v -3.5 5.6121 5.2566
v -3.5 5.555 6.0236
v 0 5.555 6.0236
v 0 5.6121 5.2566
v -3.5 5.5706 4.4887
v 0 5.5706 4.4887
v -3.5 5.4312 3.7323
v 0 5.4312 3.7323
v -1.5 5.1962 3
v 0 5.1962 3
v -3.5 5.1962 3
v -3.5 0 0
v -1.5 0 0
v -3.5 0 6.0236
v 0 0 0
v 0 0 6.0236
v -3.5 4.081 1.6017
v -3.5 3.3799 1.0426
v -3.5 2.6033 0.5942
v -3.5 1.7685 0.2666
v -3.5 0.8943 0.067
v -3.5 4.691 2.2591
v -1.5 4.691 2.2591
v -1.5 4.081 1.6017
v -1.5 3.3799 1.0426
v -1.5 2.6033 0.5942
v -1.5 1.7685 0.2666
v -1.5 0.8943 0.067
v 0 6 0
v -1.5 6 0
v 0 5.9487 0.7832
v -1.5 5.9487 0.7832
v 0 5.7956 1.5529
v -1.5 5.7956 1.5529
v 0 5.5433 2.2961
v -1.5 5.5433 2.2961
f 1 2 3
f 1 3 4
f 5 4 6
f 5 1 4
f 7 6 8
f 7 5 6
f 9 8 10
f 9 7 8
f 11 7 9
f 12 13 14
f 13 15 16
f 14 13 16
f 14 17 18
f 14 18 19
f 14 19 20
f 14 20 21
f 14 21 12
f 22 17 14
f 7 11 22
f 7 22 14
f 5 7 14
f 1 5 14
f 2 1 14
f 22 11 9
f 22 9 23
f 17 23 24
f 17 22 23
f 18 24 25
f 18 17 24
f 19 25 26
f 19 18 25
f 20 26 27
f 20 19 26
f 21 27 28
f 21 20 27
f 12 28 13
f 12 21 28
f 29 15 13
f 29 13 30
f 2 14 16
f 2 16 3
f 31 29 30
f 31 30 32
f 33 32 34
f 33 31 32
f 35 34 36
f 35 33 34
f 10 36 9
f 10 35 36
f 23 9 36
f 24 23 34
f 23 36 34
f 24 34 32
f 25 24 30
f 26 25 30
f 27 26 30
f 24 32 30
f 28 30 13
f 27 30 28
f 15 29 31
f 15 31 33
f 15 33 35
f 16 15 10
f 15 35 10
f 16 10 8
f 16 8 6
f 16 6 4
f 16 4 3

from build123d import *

# Parameters (mm, degrees)
BOSS_EXTRUDE1_DEPTH = 1.5
BOSS_EXTRUDE2_DEPTH = 3.5
BOSS_EXTRUDE3_DEPTH = 3.5
BOSS_EXTRUDE4_DEPTH = 3.5


with BuildPart() as part:
    # Sketch1 → Boss-Extrude1 (new body)
    with BuildSketch(Plane(origin=(0, 0, 0), x_dir=(0, 0, -1), z_dir=(1, 0, 0))):
        with BuildLine():
            Line((-3, 5.196152423), (-3, 0))
            Line((-3, 0), (0, 0))
            Line((0, 0), (0, 6))
            ThreePointArc((0, 6), (-1.552914271, 5.795554958), (-3, 5.196152423))
        make_face()
    extrude(amount=-BOSS_EXTRUDE1_DEPTH)

    # Sketch2 → Boss-Extrude2 (add)
    with BuildSketch(Plane(origin=(0, 0, 0), x_dir=(0, 0, -1), z_dir=(1, 0, 0))):
        with BuildLine():
            Line((-3, 0), (-6.023586903, 0))
            ThreePointArc((-6.023586903, 0), (-5.20953131, 3.004082594), (-3, 5.196152423))
            Line((-3, 5.196152423), (-3, 0))
        make_face()
    extrude(amount=-BOSS_EXTRUDE2_DEPTH)

    # Sketch3 → Boss-Extrude3 (add)
    with BuildSketch(Plane.ZY.offset(3.5)):
        with BuildLine():
            ThreePointArc((3, 5.196152423), (0.803847577, 3), (0, 0))
            Line((0, 0), (3, 0))
            Line((3, 0), (3, 5.196152423))
        make_face()
    extrude(amount=-BOSS_EXTRUDE3_DEPTH)

    # Sketch4 → Boss-Extrude4 (add)
    with BuildSketch(Plane.ZY.offset(3.5)):
        with BuildLine():
            Line((6.023586903, 0), (6.023586903, 5.554981031))
            ThreePointArc((6.023586903, 5.554981031), (4.488653077, 5.570553782), (3, 5.196152423))
            Line((3, 5.196152423), (3, 0))
            Line((3, 0), (6.023586903, 0))
        make_face()
    extrude(amount=-BOSS_EXTRUDE4_DEPTH)


solid = part.part
